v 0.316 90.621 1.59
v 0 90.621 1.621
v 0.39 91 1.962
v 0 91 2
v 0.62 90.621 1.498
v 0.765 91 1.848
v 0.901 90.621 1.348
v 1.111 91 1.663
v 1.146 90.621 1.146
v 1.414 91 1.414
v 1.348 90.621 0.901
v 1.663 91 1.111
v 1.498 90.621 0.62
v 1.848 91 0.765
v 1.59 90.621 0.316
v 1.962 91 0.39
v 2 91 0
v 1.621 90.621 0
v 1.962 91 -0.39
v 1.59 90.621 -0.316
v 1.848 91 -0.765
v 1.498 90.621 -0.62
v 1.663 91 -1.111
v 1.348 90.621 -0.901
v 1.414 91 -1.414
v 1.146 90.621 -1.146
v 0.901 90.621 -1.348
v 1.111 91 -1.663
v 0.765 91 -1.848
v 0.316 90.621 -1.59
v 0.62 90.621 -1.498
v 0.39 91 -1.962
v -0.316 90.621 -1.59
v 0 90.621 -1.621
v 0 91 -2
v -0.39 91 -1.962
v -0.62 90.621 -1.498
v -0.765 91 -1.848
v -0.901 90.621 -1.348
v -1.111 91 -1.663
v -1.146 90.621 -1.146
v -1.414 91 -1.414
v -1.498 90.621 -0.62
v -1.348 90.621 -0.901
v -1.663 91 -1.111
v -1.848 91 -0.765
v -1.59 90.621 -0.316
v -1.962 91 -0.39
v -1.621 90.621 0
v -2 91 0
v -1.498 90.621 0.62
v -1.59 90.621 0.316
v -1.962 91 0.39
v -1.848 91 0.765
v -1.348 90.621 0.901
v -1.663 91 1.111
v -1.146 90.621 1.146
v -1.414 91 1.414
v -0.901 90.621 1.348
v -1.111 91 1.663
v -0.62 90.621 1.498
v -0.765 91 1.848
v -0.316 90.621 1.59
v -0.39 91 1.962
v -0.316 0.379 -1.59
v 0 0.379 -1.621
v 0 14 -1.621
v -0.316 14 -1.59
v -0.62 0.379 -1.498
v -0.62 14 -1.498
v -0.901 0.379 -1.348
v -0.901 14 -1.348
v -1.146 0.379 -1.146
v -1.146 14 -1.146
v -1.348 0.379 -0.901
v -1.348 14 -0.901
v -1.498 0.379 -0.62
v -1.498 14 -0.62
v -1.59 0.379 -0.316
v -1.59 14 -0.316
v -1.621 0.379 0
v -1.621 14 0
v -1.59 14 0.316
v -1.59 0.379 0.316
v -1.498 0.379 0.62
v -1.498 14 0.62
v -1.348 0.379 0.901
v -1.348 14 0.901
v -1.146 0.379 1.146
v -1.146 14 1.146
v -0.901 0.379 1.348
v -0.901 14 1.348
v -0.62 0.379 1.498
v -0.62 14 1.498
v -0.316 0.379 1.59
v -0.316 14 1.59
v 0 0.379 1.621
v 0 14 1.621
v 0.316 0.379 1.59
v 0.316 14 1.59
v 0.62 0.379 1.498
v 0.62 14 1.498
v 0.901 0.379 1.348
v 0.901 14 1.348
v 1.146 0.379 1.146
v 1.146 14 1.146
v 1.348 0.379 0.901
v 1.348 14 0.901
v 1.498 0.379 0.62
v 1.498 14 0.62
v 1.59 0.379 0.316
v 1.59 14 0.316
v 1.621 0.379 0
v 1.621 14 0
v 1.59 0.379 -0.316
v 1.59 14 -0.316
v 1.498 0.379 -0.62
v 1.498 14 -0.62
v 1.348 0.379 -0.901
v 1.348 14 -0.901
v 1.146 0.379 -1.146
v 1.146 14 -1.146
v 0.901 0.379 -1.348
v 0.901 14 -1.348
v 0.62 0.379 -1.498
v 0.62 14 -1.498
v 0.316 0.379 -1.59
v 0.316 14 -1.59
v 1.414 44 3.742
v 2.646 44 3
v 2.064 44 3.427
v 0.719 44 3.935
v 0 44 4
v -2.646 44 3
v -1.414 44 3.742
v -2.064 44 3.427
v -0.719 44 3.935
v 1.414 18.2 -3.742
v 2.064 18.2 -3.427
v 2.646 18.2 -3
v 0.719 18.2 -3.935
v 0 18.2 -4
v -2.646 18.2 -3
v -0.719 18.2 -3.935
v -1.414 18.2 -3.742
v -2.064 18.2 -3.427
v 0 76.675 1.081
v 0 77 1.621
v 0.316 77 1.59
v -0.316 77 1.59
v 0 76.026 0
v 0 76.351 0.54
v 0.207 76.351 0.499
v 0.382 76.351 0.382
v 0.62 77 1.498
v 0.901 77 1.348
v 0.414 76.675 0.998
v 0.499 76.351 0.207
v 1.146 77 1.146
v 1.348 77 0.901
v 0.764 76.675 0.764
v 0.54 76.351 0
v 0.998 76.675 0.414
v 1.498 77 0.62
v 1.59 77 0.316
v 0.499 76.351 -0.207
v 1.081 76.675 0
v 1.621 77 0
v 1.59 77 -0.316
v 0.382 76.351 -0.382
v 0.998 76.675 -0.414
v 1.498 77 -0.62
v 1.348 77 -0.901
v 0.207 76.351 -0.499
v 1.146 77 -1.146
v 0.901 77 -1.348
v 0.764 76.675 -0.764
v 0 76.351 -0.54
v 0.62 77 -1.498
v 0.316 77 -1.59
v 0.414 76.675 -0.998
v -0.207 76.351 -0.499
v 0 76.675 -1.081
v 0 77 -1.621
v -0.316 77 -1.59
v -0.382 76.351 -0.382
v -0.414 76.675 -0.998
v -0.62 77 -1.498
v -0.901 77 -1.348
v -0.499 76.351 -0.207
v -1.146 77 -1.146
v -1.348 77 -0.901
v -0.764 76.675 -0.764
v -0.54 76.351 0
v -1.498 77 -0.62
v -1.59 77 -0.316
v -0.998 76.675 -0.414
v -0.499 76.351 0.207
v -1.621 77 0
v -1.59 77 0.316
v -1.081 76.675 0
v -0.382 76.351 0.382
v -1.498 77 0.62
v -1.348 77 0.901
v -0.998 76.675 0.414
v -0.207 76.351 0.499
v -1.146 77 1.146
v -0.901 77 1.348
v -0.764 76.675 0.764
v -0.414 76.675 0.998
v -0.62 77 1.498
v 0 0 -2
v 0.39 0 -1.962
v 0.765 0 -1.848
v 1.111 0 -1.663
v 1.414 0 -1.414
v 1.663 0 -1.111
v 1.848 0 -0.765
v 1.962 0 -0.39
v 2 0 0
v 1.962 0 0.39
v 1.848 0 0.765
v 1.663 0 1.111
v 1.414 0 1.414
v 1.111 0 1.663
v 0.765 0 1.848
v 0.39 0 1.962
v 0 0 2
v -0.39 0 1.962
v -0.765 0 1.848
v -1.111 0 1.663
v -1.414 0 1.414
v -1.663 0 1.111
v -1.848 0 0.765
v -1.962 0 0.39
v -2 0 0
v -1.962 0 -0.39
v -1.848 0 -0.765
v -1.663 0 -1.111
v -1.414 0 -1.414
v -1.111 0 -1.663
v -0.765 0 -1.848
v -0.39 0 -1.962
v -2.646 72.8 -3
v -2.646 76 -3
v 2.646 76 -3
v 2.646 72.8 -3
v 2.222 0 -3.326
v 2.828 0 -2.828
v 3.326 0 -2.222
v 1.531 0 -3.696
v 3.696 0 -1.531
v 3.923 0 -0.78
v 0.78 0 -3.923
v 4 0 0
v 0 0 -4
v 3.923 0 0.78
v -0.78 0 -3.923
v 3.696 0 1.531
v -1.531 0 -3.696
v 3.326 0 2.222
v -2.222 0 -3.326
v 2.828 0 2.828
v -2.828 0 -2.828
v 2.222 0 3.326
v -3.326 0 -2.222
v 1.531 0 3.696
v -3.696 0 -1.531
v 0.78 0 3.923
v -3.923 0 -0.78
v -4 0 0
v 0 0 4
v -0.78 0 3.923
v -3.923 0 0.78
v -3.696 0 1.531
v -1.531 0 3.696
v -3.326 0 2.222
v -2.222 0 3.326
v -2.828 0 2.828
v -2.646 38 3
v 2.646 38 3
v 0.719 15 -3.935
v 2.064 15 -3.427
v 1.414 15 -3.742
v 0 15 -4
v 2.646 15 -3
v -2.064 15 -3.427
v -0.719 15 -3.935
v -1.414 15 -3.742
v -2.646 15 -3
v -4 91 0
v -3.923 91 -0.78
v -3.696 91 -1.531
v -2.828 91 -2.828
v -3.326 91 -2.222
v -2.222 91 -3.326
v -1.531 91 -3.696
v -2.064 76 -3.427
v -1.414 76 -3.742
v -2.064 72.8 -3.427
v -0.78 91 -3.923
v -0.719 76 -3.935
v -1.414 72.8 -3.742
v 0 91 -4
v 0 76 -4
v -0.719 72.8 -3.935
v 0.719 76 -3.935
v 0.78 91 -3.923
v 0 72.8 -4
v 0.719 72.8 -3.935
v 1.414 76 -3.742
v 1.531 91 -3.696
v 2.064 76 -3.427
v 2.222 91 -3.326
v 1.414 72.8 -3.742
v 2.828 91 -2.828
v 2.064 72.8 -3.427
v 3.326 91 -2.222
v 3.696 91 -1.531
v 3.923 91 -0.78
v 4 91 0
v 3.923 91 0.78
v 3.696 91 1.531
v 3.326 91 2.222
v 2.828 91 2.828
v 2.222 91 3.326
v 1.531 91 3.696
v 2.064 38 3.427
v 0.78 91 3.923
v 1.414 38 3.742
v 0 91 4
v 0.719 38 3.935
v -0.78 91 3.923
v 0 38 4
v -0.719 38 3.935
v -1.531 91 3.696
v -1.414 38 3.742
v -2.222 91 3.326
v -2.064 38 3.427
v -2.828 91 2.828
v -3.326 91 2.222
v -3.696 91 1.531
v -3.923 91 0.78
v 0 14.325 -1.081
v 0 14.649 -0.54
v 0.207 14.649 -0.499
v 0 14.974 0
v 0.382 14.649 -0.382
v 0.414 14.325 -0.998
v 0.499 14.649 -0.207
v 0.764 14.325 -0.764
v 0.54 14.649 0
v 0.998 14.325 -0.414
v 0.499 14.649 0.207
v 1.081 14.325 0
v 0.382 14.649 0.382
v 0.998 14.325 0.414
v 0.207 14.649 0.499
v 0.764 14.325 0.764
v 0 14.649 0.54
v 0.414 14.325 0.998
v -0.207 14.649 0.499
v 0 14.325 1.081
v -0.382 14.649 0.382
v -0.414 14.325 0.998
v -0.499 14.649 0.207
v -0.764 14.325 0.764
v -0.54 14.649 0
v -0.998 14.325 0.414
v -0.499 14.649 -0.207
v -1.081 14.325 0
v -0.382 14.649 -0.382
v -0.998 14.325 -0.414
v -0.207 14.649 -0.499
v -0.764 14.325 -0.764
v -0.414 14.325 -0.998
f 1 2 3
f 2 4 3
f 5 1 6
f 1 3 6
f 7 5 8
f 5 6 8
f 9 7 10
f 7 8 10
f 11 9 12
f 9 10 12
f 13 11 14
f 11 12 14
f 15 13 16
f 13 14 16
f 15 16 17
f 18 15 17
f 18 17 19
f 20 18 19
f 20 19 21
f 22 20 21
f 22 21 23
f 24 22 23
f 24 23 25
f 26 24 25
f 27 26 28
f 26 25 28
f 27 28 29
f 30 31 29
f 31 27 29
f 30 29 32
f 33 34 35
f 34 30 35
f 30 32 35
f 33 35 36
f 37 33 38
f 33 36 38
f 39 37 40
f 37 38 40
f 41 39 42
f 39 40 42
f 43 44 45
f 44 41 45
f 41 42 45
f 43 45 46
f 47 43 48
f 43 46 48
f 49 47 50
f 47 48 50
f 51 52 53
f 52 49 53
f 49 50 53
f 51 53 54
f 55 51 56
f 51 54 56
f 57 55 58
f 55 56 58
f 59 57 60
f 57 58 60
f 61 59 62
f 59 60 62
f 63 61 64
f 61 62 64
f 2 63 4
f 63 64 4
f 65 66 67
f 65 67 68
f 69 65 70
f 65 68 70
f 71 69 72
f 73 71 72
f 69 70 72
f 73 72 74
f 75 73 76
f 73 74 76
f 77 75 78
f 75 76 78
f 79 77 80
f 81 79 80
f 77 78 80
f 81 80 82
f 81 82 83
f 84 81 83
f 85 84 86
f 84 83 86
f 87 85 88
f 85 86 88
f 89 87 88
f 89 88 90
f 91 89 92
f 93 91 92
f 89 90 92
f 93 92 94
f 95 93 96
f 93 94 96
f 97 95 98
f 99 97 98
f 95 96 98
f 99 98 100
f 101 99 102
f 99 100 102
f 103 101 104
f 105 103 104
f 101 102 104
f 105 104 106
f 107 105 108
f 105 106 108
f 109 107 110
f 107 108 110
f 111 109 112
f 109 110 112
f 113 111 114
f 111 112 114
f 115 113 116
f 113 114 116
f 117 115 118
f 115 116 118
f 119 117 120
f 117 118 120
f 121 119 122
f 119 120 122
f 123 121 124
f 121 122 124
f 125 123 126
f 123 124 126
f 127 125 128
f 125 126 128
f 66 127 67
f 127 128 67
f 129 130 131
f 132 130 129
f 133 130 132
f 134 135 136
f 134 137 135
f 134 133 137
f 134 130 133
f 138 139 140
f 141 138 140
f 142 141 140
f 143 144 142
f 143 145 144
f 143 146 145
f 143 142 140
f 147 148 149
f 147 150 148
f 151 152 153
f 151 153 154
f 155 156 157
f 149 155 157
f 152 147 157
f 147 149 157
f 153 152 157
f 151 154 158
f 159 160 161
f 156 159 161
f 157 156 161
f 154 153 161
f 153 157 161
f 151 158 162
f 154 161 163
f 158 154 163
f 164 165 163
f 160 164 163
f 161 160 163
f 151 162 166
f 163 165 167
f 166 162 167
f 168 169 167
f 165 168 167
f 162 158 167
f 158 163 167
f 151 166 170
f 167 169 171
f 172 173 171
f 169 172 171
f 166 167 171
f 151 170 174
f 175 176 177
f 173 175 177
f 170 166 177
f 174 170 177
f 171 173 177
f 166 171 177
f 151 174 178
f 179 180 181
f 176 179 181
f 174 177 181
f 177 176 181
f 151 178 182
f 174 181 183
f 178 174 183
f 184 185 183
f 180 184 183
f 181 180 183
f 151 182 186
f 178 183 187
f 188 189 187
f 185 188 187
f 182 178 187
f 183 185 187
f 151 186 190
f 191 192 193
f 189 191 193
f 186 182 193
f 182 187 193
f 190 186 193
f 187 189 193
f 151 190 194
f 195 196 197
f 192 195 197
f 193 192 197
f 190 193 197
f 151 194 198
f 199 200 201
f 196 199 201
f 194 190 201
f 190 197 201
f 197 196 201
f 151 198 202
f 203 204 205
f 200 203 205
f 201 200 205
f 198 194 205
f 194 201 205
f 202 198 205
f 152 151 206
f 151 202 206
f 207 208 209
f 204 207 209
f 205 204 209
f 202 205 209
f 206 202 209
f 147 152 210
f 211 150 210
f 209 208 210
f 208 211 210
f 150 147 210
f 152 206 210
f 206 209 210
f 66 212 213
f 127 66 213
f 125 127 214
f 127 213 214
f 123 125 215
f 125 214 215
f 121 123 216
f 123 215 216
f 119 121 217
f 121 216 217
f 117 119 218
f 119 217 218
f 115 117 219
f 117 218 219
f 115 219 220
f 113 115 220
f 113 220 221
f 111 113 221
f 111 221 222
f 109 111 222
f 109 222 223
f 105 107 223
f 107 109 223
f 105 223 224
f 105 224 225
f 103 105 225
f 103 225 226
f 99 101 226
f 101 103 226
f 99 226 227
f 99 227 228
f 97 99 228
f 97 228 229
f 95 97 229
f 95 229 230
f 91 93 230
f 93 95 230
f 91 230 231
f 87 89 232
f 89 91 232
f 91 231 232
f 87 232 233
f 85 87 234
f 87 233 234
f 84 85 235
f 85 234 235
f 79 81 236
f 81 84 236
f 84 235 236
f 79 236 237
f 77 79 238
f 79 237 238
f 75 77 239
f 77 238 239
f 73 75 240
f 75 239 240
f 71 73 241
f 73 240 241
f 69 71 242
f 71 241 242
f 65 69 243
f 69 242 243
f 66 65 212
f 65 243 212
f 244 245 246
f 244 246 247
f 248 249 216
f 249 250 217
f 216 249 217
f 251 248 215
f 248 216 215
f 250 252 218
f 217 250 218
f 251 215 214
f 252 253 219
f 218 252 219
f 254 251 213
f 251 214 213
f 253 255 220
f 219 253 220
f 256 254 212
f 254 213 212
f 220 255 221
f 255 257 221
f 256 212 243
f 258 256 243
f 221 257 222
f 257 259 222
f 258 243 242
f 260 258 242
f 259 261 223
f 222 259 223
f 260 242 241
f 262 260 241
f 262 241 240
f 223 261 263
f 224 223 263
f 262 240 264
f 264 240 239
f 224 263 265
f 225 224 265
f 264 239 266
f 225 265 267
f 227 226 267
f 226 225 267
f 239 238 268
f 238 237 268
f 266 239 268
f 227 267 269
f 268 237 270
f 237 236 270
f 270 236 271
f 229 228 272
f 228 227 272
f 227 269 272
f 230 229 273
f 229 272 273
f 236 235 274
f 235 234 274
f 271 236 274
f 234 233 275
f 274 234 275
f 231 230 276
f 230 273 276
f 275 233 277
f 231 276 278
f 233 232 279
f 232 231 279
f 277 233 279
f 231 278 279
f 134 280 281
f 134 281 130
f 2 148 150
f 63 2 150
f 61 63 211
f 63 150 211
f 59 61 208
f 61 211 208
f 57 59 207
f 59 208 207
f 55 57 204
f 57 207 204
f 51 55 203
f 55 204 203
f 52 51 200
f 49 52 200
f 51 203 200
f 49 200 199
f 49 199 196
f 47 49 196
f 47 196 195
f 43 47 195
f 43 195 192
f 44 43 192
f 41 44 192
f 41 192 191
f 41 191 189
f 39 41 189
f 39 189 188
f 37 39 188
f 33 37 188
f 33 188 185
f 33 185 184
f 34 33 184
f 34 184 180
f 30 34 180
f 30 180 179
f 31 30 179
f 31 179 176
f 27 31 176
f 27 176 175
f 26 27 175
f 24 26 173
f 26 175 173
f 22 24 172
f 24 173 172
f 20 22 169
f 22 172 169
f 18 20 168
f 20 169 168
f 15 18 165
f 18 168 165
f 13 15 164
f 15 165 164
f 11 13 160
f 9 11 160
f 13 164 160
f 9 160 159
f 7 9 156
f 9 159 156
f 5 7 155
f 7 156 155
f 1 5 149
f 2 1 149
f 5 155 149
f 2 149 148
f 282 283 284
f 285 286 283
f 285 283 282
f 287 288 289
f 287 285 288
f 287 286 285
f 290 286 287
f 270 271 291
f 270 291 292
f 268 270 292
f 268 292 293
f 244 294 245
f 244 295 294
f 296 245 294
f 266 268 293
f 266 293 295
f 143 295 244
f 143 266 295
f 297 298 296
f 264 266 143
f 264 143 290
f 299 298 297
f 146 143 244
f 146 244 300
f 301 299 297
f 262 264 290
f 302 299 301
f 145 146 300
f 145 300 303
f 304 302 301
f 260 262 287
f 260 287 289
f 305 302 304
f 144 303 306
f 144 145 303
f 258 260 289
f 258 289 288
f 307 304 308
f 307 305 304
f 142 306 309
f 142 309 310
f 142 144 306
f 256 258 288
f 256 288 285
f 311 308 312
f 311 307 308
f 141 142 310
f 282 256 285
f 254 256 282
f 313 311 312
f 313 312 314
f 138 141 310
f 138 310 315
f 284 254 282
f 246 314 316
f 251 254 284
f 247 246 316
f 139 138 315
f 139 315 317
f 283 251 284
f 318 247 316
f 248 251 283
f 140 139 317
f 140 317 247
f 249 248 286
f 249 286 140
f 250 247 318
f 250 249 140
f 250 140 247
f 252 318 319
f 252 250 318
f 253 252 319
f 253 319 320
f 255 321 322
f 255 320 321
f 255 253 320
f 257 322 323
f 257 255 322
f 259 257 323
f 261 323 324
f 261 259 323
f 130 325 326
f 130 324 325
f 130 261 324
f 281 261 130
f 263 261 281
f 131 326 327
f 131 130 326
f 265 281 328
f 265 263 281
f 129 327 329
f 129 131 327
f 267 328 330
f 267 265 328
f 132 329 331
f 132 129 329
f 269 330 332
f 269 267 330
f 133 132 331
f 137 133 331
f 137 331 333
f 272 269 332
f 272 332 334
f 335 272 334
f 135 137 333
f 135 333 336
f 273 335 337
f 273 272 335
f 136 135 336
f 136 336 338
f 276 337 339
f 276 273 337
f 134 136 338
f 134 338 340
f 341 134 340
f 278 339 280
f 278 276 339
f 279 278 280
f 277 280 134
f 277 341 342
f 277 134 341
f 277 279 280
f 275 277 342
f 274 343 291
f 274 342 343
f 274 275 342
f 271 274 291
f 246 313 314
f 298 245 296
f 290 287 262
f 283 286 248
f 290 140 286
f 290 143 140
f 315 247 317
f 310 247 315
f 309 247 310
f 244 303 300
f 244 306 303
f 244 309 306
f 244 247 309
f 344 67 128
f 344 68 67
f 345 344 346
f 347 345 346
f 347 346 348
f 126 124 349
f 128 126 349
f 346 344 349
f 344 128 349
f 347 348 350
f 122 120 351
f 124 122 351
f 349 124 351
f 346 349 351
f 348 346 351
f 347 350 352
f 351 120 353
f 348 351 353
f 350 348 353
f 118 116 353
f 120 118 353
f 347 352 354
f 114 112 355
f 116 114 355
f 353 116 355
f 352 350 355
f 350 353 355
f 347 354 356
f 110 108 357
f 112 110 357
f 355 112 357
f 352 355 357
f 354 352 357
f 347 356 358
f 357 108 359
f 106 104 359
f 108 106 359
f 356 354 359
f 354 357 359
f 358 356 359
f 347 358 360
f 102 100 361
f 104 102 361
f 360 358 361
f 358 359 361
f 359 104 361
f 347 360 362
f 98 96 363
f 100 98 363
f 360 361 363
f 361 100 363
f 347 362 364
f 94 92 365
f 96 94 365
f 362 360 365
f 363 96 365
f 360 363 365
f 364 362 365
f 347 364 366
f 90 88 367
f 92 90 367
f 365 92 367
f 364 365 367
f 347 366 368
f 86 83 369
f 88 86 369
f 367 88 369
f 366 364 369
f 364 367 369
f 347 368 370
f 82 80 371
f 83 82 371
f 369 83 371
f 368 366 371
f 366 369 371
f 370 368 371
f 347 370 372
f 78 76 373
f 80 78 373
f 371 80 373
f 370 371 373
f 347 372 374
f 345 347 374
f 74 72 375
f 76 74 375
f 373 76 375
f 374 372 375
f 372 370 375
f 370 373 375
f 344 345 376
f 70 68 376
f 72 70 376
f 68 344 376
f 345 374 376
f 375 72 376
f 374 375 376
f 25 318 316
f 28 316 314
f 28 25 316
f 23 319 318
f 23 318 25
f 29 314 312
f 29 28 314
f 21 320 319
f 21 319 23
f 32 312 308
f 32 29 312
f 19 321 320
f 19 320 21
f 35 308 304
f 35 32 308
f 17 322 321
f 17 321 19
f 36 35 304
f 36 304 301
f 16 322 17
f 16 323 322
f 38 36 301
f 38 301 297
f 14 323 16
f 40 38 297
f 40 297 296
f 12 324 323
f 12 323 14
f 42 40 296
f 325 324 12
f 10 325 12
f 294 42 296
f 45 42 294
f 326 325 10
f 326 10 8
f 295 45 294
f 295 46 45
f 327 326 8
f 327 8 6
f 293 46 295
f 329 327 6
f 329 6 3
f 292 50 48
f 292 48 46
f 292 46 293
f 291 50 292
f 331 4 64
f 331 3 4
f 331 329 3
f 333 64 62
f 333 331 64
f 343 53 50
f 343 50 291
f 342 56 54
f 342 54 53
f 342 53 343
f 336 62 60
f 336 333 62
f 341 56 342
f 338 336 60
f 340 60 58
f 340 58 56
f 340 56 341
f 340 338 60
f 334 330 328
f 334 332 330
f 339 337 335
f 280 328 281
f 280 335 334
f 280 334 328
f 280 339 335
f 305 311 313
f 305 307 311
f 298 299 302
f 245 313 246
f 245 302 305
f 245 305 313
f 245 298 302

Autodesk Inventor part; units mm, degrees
ref_plane "YZ Plane" through (0, 0, 0) normal (1, 0, 0) x (0, 1, 0)
ref_plane "XZ Plane" through (0, 0, 0) normal (0, 1, 0) x (-1, 0, 0)
ref_plane "XY Plane" through (0, 0, 0) normal (0, 0, 1) x (1, 0, 0)
sketch "スケッチ1" plane through (0, 0, 0) normal (0, 1, 0) x (-1, 0, 0)
  circle A0 centre (0, 0) radius 4
  dimension "d0" = 8
extrude "押し出し1" add sketch "スケッチ1" along normal blind 91
sketch "スケッチ2" plane through (0, 0, 0) normal (0, -1, 0) x (1, 0, 0)
  point P0 (0, 0)
sketch "スケッチ3" plane through (0, 91, 0) normal (0, 1, 0) x (1, 0, 0)
  point P0 (0, 0)
hole "穴1" at (0, 91, 0) direction (0, -1, 0) diameter 3.242 depth 14 tip angle 118 countersink diameter 4 countersink angle 90 thread size "M4x0.7" class "6H" standard "ISO Metric profile"
hole "穴2" at (0, 0, 0) direction (0, 1, 0) diameter 3.242 depth 14 tip angle 118 countersink diameter 4 countersink angle 90 thread size "M4x0.7" class "6H" standard "ISO Metric profile"
sketch "スケッチ4" plane through (0, 0, 0) normal (1, 0, 0) x (0, 1, 0)
  line L0 (76, -4) -> (76, 4) projected
  spline S0 degree 3 poles (39, 7.4285) (39, 7.3385) (39.0585, 7.233) (39.2835, 7.0254) (39.4498, 6.9237) (39.8139, 6.7628) (40.035, 6.6916) (40.51, 6.5961) (40.7638, 6.5723) (41.2362, 6.5723) (41.49, 6.5961) (41.965, 6.6916) (42.1861, 6.7628) (42.5502, 6.9237) (42.7165, 7.0254) (42.9415, 7.233) (43, 7.3385) (43, 7.4285) knots 0.287107 0.287107 0.287107 0.287107 0.359812 0.359812 0.432516 0.432516 0.503365 0.503365 0.574214 0.574214 0.645063 0.645063 0.715911 0.715911 0.788616 0.788616 0.861321 0.861321 0.861321 0.861321 projected
  line L1 (15, 4) -> (15, -4) projected
  line L2 (76, -3) -> (72.8, -3)
  line L3 (72.8, -3) -> (72.8, -4)
  line L4 (72.8, -4) -> (76, -4)
  line L5 (44, 4) -> (38, 4)
  line L6 (38, 4) -> (38, 3)
  line L7 (38, 3) -> (44, 3)
  line L8 (44, 3) -> (44, 4)
  line L9 (43, 7.4285) -> (39, 7.4285)
  line L10 (15, -4) -> (18.2, -4)
  line L11 (18.2, -4) -> (18.2, -3)
  line L12 (18.2, -3) -> (15, -3)
  line L13 (15, -3) -> (15, -4)
  point P0 (0, 0)
  point P1 (41, 7.4285)
  point P2 (41, 4)
  dimension "d17" = 3.2
  dimension "d18" = 1
  dimension "d19" = 6
extrude "押し出し2" cut sketch "スケッチ4" along normal through all both and the other way through all contours L4 L3 L2 L0 | L12 L11 L10 L1 | L8 L7 L6 L5
properties part number "p8ALshaftP" material "アルミニウム 2014-T4"
